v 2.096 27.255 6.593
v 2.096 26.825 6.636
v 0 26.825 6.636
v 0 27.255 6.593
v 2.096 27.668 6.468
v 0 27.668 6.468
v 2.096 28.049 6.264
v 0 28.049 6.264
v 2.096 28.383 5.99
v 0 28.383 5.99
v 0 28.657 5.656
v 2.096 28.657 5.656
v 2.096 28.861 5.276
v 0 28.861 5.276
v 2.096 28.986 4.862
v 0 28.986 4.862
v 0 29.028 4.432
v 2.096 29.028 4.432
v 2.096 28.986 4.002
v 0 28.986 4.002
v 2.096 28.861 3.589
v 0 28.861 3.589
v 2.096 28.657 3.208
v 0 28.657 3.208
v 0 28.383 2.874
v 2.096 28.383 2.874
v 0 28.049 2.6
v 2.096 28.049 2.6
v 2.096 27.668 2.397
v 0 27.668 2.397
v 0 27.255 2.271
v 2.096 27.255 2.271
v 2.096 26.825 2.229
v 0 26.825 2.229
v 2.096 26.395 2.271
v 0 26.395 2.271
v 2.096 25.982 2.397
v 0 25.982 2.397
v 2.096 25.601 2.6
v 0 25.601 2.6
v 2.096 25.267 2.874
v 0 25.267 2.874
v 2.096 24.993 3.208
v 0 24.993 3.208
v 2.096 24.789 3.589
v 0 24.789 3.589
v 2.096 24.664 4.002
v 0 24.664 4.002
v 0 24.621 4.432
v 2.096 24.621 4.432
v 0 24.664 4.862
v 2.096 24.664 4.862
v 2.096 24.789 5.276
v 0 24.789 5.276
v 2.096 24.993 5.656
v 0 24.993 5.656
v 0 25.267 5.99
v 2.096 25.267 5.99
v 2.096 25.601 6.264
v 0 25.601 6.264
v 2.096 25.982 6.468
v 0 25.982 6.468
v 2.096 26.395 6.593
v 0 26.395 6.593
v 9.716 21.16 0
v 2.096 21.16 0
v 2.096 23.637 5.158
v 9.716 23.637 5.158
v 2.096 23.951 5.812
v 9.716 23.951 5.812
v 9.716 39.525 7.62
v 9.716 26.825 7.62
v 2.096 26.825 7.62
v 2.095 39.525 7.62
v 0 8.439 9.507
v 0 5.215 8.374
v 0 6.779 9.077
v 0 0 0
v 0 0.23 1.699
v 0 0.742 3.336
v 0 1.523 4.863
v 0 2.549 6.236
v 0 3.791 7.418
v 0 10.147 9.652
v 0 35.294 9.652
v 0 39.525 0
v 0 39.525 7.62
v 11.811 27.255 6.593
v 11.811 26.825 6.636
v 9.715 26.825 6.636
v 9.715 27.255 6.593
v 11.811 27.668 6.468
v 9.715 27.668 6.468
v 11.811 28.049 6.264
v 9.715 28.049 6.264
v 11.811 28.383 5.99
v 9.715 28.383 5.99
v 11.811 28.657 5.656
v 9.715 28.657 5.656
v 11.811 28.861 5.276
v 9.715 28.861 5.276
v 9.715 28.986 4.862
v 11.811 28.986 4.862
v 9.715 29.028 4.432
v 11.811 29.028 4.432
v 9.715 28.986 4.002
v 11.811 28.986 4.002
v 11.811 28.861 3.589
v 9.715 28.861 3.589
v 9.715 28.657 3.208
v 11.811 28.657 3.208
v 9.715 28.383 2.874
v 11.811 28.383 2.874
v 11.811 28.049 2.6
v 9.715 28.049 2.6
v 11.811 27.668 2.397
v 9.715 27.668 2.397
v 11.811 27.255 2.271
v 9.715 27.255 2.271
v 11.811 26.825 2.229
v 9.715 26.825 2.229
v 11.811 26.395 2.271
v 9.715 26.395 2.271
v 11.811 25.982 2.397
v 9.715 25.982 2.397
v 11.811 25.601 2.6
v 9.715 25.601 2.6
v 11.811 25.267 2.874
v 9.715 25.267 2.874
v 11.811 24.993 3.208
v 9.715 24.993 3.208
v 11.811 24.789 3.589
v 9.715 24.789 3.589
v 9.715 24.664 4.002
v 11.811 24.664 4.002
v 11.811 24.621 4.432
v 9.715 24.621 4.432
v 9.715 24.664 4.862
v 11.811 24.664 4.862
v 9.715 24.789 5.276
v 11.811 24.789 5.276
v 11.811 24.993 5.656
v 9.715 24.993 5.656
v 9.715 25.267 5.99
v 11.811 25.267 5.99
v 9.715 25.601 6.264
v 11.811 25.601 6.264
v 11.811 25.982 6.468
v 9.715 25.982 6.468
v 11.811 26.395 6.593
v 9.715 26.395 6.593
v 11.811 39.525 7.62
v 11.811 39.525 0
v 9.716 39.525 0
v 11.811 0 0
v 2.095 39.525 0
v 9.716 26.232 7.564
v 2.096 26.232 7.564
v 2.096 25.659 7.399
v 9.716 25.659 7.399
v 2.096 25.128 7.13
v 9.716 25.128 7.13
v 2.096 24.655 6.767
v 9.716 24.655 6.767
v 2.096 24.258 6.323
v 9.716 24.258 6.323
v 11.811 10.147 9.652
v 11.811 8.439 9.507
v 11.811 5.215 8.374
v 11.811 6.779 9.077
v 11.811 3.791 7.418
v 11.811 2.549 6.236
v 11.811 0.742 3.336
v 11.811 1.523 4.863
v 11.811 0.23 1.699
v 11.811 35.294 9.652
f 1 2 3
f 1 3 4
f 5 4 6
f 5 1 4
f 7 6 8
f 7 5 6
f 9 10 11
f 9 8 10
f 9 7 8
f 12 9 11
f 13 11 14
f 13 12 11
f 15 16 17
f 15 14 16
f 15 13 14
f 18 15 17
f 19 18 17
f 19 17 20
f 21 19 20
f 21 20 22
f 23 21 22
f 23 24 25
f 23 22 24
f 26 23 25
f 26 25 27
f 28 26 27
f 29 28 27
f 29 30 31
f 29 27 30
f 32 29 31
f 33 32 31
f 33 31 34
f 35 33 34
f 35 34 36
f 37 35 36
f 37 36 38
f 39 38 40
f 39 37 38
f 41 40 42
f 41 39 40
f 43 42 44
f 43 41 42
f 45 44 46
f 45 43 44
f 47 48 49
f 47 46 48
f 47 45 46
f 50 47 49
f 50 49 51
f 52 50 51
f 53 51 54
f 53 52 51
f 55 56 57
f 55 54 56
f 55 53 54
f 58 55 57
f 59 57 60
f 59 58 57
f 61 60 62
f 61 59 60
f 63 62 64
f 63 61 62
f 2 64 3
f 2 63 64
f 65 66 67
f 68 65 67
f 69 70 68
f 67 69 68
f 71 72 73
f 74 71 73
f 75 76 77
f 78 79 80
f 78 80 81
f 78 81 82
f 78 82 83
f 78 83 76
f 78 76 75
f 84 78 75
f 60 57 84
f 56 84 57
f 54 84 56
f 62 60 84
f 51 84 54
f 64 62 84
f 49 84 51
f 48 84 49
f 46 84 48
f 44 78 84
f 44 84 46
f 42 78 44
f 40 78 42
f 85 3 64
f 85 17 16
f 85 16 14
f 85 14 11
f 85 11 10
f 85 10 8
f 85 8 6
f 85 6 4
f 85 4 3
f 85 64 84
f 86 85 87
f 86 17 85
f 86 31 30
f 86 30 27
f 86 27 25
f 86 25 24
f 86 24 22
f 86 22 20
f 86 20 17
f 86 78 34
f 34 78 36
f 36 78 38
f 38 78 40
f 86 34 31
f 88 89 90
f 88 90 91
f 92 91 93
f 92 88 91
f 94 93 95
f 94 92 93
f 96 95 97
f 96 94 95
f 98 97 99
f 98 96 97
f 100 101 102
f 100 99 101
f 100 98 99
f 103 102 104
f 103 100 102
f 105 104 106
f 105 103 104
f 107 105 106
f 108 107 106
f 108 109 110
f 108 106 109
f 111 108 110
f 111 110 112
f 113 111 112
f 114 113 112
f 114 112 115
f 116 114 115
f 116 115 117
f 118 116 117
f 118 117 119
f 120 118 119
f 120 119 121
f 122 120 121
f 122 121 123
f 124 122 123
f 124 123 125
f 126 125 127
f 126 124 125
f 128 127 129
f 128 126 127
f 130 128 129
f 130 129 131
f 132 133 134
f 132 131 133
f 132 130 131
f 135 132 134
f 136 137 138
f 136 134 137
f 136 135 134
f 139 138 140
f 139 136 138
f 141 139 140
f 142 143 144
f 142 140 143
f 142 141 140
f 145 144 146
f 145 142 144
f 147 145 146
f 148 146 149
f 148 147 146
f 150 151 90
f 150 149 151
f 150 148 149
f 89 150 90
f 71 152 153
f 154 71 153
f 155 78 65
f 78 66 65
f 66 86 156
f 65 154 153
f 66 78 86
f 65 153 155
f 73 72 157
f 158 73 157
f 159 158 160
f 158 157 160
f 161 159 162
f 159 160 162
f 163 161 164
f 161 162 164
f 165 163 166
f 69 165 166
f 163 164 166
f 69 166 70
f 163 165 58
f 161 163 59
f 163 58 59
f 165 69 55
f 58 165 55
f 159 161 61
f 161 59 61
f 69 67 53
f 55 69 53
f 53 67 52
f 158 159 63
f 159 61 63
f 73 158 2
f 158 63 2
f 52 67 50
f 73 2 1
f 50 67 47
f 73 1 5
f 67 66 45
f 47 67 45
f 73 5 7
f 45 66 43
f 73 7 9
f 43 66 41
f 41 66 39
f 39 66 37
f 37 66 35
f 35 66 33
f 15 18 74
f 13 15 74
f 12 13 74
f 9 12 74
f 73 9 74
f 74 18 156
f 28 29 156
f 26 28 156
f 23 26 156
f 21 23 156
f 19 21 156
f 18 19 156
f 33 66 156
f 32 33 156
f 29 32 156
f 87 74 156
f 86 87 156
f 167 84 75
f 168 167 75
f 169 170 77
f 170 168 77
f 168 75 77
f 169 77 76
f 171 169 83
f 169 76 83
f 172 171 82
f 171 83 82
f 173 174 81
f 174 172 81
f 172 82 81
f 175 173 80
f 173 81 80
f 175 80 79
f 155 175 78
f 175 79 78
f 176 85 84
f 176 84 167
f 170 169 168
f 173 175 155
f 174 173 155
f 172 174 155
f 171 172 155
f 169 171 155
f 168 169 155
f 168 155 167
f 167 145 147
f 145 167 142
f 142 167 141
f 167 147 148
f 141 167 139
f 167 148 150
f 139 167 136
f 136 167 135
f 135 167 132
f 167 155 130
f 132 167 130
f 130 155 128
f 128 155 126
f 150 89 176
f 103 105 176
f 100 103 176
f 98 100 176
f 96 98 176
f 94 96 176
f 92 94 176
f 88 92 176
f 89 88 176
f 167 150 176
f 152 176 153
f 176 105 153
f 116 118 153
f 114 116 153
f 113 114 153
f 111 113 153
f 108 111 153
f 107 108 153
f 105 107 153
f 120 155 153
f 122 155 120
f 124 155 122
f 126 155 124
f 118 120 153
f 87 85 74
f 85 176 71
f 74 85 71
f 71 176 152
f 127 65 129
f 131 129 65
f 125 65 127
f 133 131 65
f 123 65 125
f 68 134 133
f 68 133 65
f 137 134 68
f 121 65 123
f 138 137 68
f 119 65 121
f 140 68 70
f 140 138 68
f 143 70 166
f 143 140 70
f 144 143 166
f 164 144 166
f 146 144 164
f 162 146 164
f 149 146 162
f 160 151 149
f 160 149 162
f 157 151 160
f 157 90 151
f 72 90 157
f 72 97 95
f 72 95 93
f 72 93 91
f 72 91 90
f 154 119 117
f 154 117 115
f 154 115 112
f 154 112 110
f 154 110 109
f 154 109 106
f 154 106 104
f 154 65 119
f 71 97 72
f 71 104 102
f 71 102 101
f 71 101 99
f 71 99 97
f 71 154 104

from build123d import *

# Parameters (mm, degrees)
SKETCH1_W               = 11.811
SKETCH1_H               = 45.98924
BOSS_EXTRUDE1_DEPTH     = 9.652
FILLET5_R               = 4.826
SKETCH2_W               = 7.62
SKETCH2_H               = 22.352
CUT_EXTRUDE1_DEPTH      = 7.62
CUT_EXTRUDE2_DEPTH      = 49.452771033
CUT_EXTRUDE2_DEPTH_BACK = 49.452771033
SKETCH3_R               = 2.20345
FILLET4_R               = 4.826
FILLET6_R               = 10.16
CUT_EXTRUDE3_DEPTH      = 49.452771033
CUT_EXTRUDE4_DEPTH      = 7.62
BOSS_EXTRUDE2_DEPTH     = 7.62


with BuildPart() as part:
    # Sketch1 → Boss-Extrude1 (new body)
    with BuildSketch(Plane.XY):
        with Locations((5.9055, 22.99462)):
            Rectangle(SKETCH1_W, SKETCH1_H)
    extrude(amount=BOSS_EXTRUDE1_DEPTH)

    # Fillet5
    fillet5_edges = [part.edges().sort_by_distance(p)[0] for p in [
        (5.9055, 45.98924, 0),
    ]]
    fillet(fillet5_edges, radius=FILLET5_R)

    # Sketch2 → Cut-Extrude1 (cut)
    with BuildSketch(Plane(origin=(0, 0, 0), x_dir=(-1, 0, 0), z_dir=(0, 0, -1))):
        with Locations((-5.9055, 34.81324)):
            Rectangle(SKETCH2_W, SKETCH2_H)
    extrude(amount=-CUT_EXTRUDE1_DEPTH, mode=Mode.SUBTRACT)

    # Sketch3 → Cut-Extrude2 (cut, two sides: drawn at the far end of the back side and taken through both)
    with BuildSketch(Plane.ZY.offset(-CUT_EXTRUDE2_DEPTH_BACK)):
        with Locations((4.4323, 26.82494)):
            Circle(SKETCH3_R)
    extrude(amount=CUT_EXTRUDE2_DEPTH + CUT_EXTRUDE2_DEPTH_BACK, mode=Mode.SUBTRACT)

    # Fillet4
    # the kernel refuses this fillet: 4.826 mm, written as the material it takes off along each edge
    with BuildSketch(Plane(origin=(23.876, 45.98924, 9.652), x_dir=(0, 0, -1), z_dir=(-1, 0, 0))) as fillet4_piece_1:
        with BuildLine():
            CenterArc((FILLET4_R, FILLET4_R), FILLET4_R, 180, 90)
            Line((0, FILLET4_R), (0, 0))
            Line((0, 0), (FILLET4_R, 0))
        make_face()
    extrude(amount=35.941, mode=Mode.SUBTRACT)

    # Fillet6
    # the kernel refuses this fillet: 10.16 mm, written as the material it takes off along each edge
    with BuildSketch(Plane(origin=(-25.368230131, 0, 9.652), x_dir=(0, 1, 0), z_dir=(1, 0, 0))) as fillet6_piece_1:
        with BuildLine():
            CenterArc((10.147292053, -10.16), FILLET6_R, 90, 87.134016017)
            Line((0, -9.652), (-0.202945841, -9.64184))
            ThreePointArc((-0.202945841, -9.64184), (-0.2032, -4.826), (-0.2032, 0))
            Line((-0.2032, 0), (0, 0.2032))
            Line((0, 0.2032), (10.147292053, 0.2032))
            Line((10.147292053, 0.2032), (10.147292053, 0))
        make_face()
    extrude(amount=62.547460263, mode=Mode.SUBTRACT)

    # Sketch4 → Cut-Extrude3 (cut, through all)
    with BuildSketch(Plane(origin=(11.811, 0, 0), x_dir=(0, 0, -1), z_dir=(1, 0, 0))):
        Polygon((-9.652, 35.293813088), (-7.62, 39.52494), (0, 39.52494), (0, 45.98924), (-9.652, 45.98924), align=None)
    extrude(amount=-CUT_EXTRUDE3_DEPTH, mode=Mode.SUBTRACT)

    # Sketch5 → Cut-Extrude4 (cut)
    with BuildSketch(Plane.ZY.offset(-9.7155)):
        Polygon((0, 21.160076085), (5.158068358, 23.63724), (0, 23.63724), align=None)
    extrude(amount=CUT_EXTRUDE4_DEPTH, mode=Mode.SUBTRACT)

    # Sketch5<3> → Boss-Extrude2 (add)
    with BuildSketch(Plane.ZY.offset(-9.7155)):
        with BuildLine():
            Line((5.812301369, 23.951435604), (5.158068358, 23.63724))
            Line((5.158068358, 23.63724), (7.62, 23.63724))
            Line((7.62, 23.63724), (7.62, 26.82494))
            ThreePointArc((7.62, 26.82494), (7.130490287, 25.127530072), (5.812301369, 23.951435604))
        make_face()
    extrude(amount=BOSS_EXTRUDE2_DEPTH)


solid = part.part
